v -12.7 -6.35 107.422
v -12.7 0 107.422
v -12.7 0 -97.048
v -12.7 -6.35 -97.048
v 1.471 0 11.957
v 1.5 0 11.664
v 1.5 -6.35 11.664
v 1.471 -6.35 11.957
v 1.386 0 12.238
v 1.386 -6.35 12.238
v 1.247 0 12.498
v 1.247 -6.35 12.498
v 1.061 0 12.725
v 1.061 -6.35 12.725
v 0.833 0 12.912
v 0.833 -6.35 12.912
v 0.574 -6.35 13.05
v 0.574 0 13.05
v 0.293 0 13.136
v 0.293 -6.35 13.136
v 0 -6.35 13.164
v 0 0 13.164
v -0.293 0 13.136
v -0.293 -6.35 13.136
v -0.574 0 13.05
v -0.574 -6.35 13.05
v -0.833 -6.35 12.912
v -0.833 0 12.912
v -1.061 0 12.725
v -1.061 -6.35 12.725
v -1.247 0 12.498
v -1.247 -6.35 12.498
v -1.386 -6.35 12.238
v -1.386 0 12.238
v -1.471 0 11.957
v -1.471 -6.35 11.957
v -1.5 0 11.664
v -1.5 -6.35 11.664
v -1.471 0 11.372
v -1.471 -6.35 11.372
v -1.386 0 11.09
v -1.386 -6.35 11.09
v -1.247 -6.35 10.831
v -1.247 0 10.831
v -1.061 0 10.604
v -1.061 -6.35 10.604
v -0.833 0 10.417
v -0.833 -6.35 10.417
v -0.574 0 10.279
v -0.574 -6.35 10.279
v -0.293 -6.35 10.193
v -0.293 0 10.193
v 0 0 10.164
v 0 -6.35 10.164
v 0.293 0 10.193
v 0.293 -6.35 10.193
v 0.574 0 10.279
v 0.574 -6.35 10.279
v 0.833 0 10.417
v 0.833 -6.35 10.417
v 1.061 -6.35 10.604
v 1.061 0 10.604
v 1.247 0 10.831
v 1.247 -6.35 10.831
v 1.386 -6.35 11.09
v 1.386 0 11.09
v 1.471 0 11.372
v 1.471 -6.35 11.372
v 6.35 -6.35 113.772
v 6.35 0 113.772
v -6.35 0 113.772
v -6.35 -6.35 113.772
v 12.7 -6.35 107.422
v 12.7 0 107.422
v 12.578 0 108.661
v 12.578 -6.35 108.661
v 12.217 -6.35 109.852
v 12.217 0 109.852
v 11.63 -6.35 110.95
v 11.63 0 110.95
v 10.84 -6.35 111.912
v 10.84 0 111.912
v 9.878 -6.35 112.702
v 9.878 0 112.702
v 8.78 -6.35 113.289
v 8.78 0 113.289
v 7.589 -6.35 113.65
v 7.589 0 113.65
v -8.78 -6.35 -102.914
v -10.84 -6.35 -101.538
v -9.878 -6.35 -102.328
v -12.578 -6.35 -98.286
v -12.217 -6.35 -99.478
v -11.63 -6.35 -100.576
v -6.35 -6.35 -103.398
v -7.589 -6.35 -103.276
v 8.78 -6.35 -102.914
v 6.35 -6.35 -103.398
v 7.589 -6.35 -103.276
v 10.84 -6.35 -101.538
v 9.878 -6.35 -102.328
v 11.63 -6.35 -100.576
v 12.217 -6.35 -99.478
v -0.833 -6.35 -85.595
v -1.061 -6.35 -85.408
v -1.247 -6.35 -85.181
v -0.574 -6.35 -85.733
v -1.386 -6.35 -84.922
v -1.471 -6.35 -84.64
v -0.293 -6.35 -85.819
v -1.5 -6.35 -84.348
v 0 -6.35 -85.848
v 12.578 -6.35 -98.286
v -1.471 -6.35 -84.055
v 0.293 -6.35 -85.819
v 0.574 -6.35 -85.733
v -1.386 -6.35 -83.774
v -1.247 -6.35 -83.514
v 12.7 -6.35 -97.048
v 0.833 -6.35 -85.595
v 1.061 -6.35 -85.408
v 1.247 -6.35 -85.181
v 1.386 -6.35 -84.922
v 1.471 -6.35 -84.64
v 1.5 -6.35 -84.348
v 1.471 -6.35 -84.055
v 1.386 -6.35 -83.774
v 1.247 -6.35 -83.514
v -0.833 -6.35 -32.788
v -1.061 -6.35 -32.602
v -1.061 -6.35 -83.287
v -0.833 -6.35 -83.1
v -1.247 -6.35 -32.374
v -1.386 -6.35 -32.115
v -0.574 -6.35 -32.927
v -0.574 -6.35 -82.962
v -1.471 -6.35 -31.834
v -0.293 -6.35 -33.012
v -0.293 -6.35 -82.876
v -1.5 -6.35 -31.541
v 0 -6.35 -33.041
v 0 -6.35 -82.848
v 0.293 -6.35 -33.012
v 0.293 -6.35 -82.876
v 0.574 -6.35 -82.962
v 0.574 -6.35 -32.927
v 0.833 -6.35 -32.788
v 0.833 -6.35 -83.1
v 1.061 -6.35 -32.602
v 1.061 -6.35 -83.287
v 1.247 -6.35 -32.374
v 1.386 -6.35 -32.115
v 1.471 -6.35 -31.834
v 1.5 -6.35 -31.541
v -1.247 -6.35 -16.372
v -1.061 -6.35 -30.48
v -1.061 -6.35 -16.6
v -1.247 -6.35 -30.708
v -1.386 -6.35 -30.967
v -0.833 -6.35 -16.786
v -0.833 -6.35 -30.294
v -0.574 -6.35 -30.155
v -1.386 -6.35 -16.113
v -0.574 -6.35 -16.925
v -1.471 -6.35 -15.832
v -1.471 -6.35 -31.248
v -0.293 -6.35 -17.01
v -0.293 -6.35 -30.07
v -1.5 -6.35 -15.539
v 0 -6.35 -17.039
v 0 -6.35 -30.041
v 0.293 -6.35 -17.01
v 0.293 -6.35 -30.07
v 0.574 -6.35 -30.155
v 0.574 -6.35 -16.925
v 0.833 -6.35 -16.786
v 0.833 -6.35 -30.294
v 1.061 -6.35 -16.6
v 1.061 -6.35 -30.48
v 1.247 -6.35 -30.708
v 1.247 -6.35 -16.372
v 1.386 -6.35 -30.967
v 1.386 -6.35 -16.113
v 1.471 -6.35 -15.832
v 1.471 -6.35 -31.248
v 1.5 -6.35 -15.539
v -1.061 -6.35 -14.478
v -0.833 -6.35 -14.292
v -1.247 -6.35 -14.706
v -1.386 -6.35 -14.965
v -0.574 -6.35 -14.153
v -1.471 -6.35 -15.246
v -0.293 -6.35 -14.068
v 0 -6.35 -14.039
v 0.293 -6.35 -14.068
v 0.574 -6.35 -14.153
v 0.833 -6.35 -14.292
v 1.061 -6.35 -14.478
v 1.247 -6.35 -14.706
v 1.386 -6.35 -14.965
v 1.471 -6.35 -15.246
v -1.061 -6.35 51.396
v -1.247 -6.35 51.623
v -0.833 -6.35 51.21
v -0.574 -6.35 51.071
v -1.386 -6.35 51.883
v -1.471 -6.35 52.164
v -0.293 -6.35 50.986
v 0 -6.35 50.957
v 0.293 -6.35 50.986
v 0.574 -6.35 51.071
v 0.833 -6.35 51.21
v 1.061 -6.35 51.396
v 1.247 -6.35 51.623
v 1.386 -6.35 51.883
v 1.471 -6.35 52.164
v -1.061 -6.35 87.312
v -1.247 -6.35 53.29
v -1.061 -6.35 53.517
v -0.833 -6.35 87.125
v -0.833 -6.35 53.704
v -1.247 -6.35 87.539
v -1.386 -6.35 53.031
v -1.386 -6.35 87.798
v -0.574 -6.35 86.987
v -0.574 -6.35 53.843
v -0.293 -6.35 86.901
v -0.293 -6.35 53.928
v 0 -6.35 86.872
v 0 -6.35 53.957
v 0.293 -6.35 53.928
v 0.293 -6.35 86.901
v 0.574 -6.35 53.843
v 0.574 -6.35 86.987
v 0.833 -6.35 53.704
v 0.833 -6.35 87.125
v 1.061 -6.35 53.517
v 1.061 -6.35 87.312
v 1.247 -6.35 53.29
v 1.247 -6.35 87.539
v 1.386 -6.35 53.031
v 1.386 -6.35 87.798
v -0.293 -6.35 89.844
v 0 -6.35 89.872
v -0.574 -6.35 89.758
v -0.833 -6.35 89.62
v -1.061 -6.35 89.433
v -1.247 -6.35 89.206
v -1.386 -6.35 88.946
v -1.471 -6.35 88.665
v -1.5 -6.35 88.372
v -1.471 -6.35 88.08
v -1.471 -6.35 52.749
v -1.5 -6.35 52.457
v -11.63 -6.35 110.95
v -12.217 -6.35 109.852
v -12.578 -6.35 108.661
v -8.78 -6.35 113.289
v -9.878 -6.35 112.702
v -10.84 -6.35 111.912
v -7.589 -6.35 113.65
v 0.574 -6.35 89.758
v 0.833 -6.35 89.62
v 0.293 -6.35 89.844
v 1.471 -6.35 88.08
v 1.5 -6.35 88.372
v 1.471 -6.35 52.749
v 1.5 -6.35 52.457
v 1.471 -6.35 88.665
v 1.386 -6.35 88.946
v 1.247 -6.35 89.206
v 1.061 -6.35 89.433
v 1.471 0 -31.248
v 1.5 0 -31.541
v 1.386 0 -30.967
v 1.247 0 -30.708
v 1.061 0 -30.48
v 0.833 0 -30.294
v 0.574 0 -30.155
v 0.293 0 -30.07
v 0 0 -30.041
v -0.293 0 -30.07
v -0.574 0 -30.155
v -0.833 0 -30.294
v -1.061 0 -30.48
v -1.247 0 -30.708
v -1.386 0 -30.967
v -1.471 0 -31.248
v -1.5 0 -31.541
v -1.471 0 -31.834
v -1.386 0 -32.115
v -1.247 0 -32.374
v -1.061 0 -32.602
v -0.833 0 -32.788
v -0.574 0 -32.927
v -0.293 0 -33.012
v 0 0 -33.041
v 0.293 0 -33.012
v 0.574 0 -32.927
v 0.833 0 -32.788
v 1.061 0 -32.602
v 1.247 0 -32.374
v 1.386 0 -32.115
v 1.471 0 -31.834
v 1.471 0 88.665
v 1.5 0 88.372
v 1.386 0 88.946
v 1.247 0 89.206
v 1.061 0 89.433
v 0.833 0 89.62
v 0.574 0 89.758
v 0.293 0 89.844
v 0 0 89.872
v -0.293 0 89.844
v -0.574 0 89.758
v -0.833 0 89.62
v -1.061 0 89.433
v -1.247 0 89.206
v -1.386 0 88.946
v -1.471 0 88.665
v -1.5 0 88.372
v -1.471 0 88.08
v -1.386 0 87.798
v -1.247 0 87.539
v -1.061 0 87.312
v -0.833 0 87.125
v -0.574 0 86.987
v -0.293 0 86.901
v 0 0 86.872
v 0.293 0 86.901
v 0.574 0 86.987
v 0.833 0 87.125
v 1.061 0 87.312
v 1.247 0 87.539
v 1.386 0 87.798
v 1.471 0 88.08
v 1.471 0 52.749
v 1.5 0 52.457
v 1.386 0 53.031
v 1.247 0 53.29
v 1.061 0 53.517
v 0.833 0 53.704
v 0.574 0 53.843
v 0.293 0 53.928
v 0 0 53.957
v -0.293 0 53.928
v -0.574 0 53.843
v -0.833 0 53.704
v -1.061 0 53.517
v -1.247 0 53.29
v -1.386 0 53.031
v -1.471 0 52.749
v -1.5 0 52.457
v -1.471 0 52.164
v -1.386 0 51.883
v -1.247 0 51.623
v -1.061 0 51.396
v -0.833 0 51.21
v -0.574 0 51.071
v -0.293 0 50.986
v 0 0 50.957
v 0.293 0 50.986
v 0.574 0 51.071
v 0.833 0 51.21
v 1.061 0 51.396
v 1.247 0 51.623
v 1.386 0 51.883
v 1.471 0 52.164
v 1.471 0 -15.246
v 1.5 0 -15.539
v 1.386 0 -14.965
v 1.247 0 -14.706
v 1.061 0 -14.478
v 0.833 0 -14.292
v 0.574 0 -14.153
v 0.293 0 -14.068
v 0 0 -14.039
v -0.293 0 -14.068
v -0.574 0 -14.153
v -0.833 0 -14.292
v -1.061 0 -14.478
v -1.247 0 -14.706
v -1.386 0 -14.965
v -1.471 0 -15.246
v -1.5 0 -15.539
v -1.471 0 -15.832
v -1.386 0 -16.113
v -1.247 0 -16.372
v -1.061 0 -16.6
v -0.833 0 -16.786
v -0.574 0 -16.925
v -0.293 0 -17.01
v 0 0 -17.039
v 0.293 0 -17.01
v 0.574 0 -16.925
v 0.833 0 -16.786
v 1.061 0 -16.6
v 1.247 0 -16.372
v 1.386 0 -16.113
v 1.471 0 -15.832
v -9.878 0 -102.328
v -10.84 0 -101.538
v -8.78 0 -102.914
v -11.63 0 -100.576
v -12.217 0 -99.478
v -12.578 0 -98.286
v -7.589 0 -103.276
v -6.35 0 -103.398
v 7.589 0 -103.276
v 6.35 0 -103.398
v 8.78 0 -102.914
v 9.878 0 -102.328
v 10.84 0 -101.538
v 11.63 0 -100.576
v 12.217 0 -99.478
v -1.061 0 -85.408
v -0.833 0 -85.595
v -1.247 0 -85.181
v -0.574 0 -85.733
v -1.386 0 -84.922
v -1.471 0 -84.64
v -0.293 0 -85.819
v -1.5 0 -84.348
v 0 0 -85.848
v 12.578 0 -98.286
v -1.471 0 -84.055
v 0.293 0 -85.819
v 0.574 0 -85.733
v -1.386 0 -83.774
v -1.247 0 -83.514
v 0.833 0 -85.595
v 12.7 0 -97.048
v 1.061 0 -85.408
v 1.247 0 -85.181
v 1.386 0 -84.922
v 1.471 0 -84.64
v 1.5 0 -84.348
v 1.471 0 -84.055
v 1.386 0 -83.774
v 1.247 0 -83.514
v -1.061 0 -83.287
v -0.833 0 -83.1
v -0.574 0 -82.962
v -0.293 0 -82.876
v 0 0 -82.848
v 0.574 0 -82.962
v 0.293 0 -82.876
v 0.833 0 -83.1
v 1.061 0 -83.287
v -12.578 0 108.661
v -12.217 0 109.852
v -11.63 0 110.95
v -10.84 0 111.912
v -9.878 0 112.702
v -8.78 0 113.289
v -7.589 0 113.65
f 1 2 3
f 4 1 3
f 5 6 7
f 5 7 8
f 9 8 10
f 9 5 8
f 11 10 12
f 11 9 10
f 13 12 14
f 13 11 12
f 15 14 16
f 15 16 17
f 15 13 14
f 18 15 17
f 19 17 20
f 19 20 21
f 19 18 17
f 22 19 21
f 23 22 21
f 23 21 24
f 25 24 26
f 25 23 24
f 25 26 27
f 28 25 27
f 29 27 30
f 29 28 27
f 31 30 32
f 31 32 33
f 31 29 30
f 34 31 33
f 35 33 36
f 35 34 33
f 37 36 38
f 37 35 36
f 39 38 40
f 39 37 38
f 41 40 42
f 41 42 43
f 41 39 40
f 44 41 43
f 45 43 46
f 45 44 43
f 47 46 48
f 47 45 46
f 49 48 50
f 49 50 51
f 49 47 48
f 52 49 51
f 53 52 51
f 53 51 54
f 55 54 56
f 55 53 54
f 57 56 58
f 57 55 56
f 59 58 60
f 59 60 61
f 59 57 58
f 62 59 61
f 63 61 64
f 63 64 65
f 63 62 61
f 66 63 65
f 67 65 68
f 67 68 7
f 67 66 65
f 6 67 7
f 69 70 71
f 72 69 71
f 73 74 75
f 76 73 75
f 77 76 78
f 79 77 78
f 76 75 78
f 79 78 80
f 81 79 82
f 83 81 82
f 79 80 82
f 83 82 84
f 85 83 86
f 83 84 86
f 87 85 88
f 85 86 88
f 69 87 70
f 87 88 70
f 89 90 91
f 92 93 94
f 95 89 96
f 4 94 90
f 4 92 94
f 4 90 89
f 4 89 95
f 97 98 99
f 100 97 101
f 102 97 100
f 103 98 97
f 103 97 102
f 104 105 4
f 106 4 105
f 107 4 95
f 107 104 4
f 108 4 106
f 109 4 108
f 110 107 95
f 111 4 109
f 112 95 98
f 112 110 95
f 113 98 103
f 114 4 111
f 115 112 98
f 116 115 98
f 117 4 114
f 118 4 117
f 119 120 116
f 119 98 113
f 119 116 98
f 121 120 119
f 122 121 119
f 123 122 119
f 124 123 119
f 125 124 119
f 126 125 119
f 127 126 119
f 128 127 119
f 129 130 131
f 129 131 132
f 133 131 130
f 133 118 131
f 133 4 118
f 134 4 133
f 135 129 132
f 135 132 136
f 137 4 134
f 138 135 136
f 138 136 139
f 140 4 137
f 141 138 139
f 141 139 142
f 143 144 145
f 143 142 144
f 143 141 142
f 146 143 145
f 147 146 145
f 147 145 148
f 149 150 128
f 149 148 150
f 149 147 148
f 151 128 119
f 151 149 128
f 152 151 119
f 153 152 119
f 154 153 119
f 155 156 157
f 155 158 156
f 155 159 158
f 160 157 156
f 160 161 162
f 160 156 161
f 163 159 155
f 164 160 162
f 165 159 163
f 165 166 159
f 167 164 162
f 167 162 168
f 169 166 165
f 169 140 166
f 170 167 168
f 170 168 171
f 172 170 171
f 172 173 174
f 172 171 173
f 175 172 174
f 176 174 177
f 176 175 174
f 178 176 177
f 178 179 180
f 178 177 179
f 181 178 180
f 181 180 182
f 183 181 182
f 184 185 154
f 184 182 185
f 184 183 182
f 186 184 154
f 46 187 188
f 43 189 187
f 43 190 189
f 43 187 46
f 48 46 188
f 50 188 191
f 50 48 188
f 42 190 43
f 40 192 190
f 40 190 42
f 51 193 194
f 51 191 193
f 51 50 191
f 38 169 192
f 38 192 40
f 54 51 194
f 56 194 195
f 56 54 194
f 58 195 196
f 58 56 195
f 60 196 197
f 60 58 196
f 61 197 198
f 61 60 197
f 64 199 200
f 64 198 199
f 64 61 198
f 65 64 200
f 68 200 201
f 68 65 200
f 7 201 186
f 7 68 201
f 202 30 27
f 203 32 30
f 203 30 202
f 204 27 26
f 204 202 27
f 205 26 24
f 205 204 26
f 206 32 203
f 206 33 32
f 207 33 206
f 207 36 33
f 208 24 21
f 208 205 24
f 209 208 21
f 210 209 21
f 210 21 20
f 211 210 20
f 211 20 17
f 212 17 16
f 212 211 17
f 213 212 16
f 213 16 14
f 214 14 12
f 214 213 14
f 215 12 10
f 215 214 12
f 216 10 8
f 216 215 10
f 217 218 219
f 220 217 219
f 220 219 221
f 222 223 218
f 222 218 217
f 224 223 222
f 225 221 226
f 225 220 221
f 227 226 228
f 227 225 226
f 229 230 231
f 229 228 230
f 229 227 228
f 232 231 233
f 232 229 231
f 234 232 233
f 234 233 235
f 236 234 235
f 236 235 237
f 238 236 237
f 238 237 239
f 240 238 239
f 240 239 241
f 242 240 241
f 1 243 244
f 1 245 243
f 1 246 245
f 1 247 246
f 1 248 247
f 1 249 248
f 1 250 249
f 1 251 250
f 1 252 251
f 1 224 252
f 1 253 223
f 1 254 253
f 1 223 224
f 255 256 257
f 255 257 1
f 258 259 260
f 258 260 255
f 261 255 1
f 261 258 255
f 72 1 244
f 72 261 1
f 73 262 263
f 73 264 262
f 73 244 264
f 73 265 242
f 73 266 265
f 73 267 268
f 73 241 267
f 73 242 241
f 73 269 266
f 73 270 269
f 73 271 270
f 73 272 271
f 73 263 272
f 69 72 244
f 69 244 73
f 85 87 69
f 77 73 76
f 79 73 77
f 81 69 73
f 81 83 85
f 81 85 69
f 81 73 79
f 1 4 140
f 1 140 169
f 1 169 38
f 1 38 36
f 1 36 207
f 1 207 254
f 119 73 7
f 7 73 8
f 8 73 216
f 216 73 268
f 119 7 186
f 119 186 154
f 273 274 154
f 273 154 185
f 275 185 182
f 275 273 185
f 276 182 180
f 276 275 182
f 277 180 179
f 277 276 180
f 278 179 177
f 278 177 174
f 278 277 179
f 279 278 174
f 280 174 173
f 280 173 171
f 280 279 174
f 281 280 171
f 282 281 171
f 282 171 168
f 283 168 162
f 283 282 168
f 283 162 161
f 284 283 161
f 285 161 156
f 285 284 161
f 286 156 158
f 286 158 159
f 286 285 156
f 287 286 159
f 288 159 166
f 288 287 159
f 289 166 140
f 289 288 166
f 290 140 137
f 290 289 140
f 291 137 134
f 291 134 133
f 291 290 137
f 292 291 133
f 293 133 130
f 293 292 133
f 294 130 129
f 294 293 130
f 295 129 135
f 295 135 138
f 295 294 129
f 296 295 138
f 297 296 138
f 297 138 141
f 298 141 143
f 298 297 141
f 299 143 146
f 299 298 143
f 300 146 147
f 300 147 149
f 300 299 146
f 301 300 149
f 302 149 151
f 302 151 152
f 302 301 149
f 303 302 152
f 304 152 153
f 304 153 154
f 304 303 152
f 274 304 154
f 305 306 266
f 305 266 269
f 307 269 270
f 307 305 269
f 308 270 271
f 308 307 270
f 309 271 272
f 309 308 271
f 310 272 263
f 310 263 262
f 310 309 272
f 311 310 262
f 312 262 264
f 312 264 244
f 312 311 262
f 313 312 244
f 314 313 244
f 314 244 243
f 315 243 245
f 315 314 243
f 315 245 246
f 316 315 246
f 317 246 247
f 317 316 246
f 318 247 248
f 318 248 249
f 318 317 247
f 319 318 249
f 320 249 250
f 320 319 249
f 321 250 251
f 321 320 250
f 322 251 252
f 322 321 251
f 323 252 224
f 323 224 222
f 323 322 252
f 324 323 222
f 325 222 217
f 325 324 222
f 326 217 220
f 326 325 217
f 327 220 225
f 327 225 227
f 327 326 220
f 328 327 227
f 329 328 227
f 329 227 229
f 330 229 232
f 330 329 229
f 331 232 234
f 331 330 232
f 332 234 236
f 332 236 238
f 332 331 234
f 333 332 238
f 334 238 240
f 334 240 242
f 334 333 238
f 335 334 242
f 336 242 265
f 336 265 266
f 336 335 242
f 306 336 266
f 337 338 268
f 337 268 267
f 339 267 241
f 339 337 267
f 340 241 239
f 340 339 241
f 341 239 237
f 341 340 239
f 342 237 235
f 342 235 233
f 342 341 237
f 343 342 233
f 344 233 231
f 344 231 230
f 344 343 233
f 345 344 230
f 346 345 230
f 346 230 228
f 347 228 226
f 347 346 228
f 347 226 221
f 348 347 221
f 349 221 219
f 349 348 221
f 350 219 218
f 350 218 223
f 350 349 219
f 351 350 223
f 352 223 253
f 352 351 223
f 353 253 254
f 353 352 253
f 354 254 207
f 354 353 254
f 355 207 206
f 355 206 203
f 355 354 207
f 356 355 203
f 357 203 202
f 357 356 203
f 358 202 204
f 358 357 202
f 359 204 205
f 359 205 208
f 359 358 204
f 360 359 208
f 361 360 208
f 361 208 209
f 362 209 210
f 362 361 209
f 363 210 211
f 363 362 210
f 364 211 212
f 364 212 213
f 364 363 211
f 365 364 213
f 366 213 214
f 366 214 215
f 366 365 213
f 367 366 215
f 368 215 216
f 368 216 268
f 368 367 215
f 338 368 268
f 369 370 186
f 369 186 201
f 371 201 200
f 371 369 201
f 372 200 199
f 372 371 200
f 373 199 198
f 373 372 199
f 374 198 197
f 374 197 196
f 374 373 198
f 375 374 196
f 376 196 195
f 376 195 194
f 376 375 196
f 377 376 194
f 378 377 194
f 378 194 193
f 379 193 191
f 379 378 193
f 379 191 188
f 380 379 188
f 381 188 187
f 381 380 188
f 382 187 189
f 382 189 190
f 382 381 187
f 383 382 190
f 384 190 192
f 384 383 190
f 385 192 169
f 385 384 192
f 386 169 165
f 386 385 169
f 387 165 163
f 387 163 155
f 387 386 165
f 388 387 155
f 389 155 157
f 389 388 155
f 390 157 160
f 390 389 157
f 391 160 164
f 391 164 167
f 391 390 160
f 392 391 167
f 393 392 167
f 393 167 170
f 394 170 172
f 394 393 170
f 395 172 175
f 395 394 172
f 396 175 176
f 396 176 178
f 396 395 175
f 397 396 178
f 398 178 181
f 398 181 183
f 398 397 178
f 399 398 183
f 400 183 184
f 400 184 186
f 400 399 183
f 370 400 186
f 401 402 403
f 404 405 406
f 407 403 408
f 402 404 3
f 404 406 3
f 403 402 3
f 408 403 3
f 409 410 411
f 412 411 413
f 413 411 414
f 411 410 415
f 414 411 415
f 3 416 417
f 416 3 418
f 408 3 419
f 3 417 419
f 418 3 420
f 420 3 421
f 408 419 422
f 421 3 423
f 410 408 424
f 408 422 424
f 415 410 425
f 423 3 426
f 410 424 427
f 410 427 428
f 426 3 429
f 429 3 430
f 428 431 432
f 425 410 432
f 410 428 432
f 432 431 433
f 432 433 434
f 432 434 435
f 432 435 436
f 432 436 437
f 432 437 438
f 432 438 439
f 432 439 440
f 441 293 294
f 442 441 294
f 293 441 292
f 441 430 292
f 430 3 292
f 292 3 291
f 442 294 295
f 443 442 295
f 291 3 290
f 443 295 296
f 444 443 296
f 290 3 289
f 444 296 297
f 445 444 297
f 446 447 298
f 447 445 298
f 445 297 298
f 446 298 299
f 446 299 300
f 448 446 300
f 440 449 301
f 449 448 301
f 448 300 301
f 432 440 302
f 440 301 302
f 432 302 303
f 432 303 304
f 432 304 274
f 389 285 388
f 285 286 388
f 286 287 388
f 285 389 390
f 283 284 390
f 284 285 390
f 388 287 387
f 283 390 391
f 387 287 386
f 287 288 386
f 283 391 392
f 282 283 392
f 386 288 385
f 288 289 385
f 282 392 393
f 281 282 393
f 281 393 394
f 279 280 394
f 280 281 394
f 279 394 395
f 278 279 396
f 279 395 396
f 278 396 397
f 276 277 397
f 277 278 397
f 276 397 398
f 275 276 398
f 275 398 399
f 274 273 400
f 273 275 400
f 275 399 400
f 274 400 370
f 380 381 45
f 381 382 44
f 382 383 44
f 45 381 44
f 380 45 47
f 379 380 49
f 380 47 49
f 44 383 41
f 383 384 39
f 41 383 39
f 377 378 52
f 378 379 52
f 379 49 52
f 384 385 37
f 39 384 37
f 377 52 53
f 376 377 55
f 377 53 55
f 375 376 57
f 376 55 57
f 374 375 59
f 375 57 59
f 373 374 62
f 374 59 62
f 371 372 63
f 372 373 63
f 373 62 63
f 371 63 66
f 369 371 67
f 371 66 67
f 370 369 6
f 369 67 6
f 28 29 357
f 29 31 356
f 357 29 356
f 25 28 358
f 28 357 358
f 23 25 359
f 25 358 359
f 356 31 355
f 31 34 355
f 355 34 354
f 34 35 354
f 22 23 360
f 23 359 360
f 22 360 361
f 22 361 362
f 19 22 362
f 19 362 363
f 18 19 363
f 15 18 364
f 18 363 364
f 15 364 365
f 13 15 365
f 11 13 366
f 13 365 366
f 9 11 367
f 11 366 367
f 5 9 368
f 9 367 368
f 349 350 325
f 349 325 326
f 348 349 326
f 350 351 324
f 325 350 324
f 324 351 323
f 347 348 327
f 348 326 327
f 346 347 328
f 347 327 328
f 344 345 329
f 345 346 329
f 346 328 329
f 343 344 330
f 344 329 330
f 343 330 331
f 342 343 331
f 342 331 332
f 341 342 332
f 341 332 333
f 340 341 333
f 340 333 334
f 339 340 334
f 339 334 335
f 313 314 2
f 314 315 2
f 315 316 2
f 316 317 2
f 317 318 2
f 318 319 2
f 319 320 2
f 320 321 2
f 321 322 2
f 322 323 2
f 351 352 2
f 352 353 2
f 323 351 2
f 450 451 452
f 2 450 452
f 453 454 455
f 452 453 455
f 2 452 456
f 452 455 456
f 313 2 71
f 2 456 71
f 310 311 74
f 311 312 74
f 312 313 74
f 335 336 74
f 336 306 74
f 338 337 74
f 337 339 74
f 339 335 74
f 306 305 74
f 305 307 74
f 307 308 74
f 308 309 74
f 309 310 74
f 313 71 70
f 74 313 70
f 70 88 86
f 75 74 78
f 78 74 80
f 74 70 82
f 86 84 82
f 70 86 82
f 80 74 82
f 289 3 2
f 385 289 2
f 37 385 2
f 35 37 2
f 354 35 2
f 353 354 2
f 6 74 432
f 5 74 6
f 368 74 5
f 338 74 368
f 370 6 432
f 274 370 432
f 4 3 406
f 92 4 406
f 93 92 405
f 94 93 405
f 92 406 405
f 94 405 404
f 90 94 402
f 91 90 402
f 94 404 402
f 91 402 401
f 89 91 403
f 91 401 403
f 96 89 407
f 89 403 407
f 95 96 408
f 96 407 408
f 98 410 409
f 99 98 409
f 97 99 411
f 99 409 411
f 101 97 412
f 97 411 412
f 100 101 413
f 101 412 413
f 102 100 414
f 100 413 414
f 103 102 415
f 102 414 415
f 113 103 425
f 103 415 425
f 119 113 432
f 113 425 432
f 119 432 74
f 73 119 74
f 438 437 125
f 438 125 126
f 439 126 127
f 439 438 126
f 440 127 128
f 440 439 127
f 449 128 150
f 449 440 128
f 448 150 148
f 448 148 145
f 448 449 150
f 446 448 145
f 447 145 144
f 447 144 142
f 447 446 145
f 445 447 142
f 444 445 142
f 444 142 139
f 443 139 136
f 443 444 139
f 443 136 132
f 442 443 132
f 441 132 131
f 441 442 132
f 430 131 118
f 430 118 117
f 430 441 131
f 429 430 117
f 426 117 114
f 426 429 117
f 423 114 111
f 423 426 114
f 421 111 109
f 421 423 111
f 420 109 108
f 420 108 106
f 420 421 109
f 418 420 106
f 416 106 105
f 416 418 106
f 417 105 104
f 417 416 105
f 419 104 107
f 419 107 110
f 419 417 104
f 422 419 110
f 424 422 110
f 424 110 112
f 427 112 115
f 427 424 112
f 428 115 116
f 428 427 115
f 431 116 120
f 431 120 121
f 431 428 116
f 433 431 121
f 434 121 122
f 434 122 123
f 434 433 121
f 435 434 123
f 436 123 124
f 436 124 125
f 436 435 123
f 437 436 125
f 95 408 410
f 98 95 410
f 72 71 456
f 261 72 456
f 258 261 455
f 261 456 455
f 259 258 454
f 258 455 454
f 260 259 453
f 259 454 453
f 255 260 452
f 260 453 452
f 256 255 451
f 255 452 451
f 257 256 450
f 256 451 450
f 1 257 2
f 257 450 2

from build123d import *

# Parameters (mm, degrees)
F0_R     = 1.5
F0_R_2   = 1.499997
F1_DEPTH = 6.35


with BuildPart() as f1:
    # F0 (on Front) → F1 (new body)
    with BuildSketch(Plane.XZ):
        with BuildLine():
            Line((6.35, 113.772324), (-6.35, 113.772324))
            ThreePointArc((-6.35, 113.772324), (-10.840128, 111.912452), (-12.7, 107.422324))
            Line((-12.7, 107.422324), (-12.7, -97.047676))
            ThreePointArc((-12.7, -97.047676), (-10.840128, -101.537804), (-6.35, -103.397676))
            Line((-6.35, -103.397676), (6.35, -103.397676))
            ThreePointArc((6.35, -103.397676), (10.840128, -101.537804), (12.7, -97.047676))
            Line((12.7, -97.047676), (12.7, 107.422324))
            ThreePointArc((12.7, 107.422324), (10.840128, 111.912452), (6.35, 113.772324))
        make_face()
        with Locations((0, -84.347676)):
            Circle(F0_R, mode=Mode.SUBTRACT)
        with Locations((0, -31.541076)):
            Circle(F0_R, mode=Mode.SUBTRACT)
        with Locations((0, -15.539076)):
            Circle(F0_R, mode=Mode.SUBTRACT)
        with Locations((0, 11.664324)):
            Circle(F0_R, mode=Mode.SUBTRACT)
        with Locations((0, 52.456724)):
            Circle(F0_R_2, mode=Mode.SUBTRACT)
        with Locations((0, 88.372324)):
            Circle(F0_R, mode=Mode.SUBTRACT)
    extrude(amount=F1_DEPTH)


solid = f1.part
